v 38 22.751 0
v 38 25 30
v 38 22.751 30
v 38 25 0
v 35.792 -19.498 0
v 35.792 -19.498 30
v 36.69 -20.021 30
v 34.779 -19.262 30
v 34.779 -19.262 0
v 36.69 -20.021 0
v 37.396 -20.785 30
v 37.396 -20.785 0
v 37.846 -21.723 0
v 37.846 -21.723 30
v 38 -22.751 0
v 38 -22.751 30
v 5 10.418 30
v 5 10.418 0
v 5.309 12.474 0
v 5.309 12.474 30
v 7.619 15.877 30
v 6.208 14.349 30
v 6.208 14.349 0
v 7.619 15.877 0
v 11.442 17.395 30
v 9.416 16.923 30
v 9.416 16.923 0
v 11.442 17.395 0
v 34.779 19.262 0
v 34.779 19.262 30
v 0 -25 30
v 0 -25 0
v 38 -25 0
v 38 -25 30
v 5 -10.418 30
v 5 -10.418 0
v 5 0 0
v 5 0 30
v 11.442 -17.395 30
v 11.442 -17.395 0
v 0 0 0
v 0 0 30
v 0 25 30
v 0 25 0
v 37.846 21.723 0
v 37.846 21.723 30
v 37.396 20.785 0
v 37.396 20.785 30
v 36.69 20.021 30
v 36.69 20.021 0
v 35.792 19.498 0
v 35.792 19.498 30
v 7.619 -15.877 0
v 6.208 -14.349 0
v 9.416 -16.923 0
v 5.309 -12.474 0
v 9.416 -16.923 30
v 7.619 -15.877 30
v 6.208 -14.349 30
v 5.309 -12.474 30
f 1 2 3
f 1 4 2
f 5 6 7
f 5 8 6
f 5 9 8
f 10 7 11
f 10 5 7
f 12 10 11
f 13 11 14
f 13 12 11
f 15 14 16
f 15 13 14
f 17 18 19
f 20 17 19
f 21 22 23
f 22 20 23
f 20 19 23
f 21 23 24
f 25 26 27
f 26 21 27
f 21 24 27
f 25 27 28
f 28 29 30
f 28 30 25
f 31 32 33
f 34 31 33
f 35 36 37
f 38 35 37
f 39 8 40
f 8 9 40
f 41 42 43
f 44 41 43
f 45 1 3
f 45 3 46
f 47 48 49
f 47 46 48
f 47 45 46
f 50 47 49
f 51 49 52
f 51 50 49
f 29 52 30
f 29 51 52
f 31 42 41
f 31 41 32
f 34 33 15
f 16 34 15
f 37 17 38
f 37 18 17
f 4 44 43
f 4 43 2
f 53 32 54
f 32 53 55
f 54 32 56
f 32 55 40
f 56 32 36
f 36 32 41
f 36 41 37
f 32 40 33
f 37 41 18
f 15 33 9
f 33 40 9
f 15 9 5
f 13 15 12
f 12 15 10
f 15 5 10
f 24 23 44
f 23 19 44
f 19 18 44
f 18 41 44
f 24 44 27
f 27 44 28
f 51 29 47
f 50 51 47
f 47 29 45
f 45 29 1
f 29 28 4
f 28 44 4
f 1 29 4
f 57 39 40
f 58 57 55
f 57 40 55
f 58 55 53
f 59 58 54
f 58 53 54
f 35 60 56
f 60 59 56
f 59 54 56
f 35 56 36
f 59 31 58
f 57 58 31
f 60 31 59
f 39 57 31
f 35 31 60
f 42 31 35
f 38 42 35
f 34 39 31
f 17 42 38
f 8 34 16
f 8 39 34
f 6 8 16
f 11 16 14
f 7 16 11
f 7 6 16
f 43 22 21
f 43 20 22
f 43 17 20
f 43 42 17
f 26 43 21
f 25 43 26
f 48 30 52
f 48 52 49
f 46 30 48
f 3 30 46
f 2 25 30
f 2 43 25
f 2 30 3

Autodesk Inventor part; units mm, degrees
ref_plane "YZ Plane" through (0, 0, 0) normal (1, 0, 0) x (0, 1, 0)
ref_plane "Начальная плоскость" through (0, 0, 0) normal (0, 0, 1) x (1, 0, 0)
ref_plane "Конечная плоскость" through (0, 0, 30) normal (0, 0, 1) x (1, 0, 0)
sketch "Эскиз" plane through (0, 0, 0) normal (0, 0, 1) x (1, 0, 0)
  line L0 (0, 0) -> (0, 25)
  line L1 (0, 25) -> (38, 25)
  line L2 (38, 25) -> (38, 22.7512)
  line L3 (34.7791, 19.2623) -> (11.4418, 17.3953)
  line L4 (5, 10.4176) -> (5, 0)
  line L5 (5, 0) -> (0, 0) construction
  line L6 (19, 25) -> (19, 18) construction
  line L7 (38, 19.52) -> (38, 18) construction
  line L8 (38, 18) -> (19, 18) construction
  line L9 (0, 15) -> (0, -27) construction
  line L10 (-5.539, 0) -> (16.0067, 0) construction
  line L11 (0, 0) -> (0, -25)
  line L12 (0, -25) -> (38, -25)
  line L13 (38, -25) -> (38, -22.7512)
  line L14 (34.7791, -19.2623) -> (11.4418, -17.3953)
  line L15 (5, -10.4176) -> (5, 0)
  arc A0 (11.4418, 17.3953) -> (5, 10.4176) centre (12, 10.4176) ccw
  arc A1 (5, -10.4176) -> (11.4418, -17.3953) centre (12, -10.4176) ccw
  arc A2 (34.7791, 19.2623) -> (38, 22.7512) centre (34.5, 22.7512) ccw
  arc A3 (38, -22.7512) -> (34.7791, -19.2623) centre (34.5, -22.7512) ccw
  line L16 (0, 23.4) -> (0, -35.4) construction
  line L17 (-9.8481, 0) -> (20.3158, 0) construction
  point P0 (5, 16.88)
  point P1 (38, -19.52)
  point P2 (5, -16.88)
  point P3 (19, -25)
  point P4 (19, -18)
  dimension "d0" = 5
  dimension "d1" = 25
  dimension "d2" = 38
  dimension "d3" = 7
  dimension "d4" = 19
  dimension "d5" = 1.52
  dimension "d23" = 7
  dimension "d24" = 3.5
  dimension "d25" = 0
extrude "Базовый элемент" add sketch "Эскиз" along normal up to surface (30 mm away) from surface at 0
sketch "Sketch3" plane through (0, 0, 0) normal (0, 0, 1) x (1, 0, 0)
  line L0 (0, 0) -> (10, 0)
ref_plane "Work Plane3" through (0, 0, 0) normal (0, -1, 0) x (1, 0, 0)
sketch "Sketch4" plane through (0, 0, 0) normal (0, -1, 0) x (1, 0, 0)
  line L0 (-2, 0) -> (12, 0) projected
  line L1 (-2, 30) -> (12, 30) projected
  dimension "d29" = 30
equation "\"d0\" = G_T"
equation "\"d1\" = 0.5 * G_H"
equation "\"d2\" = G_W"
equation "\"d3\" = G_T1"
equation "\"d4\" = G_C"
equation "\"d23\" = G_IR"
equation "\"d24\" = G_ER"
equation "\"d6\" = G_L"
equation "\"G_W\" = 38"
equation "\"G_T\" = 5"
equation "\"G_T1\" = 7"
equation "\"G_NG\" = 0.08"
equation "\"G_ER\" = 3.5"
equation "\"G_IR\" = 7"
equation "\"G_C\" = 19"
equation "\"G_L\" = d29"
equation "\"ex\" = 0"
equation "\"G_OFFSET_START\" = 0"
equation "\"G_OFFSET_END\" = 0"
equation "\"G_H\" = 50"
properties part number "DIN1026-1 - U 50 - 30" material "Сталь, мягкая"
